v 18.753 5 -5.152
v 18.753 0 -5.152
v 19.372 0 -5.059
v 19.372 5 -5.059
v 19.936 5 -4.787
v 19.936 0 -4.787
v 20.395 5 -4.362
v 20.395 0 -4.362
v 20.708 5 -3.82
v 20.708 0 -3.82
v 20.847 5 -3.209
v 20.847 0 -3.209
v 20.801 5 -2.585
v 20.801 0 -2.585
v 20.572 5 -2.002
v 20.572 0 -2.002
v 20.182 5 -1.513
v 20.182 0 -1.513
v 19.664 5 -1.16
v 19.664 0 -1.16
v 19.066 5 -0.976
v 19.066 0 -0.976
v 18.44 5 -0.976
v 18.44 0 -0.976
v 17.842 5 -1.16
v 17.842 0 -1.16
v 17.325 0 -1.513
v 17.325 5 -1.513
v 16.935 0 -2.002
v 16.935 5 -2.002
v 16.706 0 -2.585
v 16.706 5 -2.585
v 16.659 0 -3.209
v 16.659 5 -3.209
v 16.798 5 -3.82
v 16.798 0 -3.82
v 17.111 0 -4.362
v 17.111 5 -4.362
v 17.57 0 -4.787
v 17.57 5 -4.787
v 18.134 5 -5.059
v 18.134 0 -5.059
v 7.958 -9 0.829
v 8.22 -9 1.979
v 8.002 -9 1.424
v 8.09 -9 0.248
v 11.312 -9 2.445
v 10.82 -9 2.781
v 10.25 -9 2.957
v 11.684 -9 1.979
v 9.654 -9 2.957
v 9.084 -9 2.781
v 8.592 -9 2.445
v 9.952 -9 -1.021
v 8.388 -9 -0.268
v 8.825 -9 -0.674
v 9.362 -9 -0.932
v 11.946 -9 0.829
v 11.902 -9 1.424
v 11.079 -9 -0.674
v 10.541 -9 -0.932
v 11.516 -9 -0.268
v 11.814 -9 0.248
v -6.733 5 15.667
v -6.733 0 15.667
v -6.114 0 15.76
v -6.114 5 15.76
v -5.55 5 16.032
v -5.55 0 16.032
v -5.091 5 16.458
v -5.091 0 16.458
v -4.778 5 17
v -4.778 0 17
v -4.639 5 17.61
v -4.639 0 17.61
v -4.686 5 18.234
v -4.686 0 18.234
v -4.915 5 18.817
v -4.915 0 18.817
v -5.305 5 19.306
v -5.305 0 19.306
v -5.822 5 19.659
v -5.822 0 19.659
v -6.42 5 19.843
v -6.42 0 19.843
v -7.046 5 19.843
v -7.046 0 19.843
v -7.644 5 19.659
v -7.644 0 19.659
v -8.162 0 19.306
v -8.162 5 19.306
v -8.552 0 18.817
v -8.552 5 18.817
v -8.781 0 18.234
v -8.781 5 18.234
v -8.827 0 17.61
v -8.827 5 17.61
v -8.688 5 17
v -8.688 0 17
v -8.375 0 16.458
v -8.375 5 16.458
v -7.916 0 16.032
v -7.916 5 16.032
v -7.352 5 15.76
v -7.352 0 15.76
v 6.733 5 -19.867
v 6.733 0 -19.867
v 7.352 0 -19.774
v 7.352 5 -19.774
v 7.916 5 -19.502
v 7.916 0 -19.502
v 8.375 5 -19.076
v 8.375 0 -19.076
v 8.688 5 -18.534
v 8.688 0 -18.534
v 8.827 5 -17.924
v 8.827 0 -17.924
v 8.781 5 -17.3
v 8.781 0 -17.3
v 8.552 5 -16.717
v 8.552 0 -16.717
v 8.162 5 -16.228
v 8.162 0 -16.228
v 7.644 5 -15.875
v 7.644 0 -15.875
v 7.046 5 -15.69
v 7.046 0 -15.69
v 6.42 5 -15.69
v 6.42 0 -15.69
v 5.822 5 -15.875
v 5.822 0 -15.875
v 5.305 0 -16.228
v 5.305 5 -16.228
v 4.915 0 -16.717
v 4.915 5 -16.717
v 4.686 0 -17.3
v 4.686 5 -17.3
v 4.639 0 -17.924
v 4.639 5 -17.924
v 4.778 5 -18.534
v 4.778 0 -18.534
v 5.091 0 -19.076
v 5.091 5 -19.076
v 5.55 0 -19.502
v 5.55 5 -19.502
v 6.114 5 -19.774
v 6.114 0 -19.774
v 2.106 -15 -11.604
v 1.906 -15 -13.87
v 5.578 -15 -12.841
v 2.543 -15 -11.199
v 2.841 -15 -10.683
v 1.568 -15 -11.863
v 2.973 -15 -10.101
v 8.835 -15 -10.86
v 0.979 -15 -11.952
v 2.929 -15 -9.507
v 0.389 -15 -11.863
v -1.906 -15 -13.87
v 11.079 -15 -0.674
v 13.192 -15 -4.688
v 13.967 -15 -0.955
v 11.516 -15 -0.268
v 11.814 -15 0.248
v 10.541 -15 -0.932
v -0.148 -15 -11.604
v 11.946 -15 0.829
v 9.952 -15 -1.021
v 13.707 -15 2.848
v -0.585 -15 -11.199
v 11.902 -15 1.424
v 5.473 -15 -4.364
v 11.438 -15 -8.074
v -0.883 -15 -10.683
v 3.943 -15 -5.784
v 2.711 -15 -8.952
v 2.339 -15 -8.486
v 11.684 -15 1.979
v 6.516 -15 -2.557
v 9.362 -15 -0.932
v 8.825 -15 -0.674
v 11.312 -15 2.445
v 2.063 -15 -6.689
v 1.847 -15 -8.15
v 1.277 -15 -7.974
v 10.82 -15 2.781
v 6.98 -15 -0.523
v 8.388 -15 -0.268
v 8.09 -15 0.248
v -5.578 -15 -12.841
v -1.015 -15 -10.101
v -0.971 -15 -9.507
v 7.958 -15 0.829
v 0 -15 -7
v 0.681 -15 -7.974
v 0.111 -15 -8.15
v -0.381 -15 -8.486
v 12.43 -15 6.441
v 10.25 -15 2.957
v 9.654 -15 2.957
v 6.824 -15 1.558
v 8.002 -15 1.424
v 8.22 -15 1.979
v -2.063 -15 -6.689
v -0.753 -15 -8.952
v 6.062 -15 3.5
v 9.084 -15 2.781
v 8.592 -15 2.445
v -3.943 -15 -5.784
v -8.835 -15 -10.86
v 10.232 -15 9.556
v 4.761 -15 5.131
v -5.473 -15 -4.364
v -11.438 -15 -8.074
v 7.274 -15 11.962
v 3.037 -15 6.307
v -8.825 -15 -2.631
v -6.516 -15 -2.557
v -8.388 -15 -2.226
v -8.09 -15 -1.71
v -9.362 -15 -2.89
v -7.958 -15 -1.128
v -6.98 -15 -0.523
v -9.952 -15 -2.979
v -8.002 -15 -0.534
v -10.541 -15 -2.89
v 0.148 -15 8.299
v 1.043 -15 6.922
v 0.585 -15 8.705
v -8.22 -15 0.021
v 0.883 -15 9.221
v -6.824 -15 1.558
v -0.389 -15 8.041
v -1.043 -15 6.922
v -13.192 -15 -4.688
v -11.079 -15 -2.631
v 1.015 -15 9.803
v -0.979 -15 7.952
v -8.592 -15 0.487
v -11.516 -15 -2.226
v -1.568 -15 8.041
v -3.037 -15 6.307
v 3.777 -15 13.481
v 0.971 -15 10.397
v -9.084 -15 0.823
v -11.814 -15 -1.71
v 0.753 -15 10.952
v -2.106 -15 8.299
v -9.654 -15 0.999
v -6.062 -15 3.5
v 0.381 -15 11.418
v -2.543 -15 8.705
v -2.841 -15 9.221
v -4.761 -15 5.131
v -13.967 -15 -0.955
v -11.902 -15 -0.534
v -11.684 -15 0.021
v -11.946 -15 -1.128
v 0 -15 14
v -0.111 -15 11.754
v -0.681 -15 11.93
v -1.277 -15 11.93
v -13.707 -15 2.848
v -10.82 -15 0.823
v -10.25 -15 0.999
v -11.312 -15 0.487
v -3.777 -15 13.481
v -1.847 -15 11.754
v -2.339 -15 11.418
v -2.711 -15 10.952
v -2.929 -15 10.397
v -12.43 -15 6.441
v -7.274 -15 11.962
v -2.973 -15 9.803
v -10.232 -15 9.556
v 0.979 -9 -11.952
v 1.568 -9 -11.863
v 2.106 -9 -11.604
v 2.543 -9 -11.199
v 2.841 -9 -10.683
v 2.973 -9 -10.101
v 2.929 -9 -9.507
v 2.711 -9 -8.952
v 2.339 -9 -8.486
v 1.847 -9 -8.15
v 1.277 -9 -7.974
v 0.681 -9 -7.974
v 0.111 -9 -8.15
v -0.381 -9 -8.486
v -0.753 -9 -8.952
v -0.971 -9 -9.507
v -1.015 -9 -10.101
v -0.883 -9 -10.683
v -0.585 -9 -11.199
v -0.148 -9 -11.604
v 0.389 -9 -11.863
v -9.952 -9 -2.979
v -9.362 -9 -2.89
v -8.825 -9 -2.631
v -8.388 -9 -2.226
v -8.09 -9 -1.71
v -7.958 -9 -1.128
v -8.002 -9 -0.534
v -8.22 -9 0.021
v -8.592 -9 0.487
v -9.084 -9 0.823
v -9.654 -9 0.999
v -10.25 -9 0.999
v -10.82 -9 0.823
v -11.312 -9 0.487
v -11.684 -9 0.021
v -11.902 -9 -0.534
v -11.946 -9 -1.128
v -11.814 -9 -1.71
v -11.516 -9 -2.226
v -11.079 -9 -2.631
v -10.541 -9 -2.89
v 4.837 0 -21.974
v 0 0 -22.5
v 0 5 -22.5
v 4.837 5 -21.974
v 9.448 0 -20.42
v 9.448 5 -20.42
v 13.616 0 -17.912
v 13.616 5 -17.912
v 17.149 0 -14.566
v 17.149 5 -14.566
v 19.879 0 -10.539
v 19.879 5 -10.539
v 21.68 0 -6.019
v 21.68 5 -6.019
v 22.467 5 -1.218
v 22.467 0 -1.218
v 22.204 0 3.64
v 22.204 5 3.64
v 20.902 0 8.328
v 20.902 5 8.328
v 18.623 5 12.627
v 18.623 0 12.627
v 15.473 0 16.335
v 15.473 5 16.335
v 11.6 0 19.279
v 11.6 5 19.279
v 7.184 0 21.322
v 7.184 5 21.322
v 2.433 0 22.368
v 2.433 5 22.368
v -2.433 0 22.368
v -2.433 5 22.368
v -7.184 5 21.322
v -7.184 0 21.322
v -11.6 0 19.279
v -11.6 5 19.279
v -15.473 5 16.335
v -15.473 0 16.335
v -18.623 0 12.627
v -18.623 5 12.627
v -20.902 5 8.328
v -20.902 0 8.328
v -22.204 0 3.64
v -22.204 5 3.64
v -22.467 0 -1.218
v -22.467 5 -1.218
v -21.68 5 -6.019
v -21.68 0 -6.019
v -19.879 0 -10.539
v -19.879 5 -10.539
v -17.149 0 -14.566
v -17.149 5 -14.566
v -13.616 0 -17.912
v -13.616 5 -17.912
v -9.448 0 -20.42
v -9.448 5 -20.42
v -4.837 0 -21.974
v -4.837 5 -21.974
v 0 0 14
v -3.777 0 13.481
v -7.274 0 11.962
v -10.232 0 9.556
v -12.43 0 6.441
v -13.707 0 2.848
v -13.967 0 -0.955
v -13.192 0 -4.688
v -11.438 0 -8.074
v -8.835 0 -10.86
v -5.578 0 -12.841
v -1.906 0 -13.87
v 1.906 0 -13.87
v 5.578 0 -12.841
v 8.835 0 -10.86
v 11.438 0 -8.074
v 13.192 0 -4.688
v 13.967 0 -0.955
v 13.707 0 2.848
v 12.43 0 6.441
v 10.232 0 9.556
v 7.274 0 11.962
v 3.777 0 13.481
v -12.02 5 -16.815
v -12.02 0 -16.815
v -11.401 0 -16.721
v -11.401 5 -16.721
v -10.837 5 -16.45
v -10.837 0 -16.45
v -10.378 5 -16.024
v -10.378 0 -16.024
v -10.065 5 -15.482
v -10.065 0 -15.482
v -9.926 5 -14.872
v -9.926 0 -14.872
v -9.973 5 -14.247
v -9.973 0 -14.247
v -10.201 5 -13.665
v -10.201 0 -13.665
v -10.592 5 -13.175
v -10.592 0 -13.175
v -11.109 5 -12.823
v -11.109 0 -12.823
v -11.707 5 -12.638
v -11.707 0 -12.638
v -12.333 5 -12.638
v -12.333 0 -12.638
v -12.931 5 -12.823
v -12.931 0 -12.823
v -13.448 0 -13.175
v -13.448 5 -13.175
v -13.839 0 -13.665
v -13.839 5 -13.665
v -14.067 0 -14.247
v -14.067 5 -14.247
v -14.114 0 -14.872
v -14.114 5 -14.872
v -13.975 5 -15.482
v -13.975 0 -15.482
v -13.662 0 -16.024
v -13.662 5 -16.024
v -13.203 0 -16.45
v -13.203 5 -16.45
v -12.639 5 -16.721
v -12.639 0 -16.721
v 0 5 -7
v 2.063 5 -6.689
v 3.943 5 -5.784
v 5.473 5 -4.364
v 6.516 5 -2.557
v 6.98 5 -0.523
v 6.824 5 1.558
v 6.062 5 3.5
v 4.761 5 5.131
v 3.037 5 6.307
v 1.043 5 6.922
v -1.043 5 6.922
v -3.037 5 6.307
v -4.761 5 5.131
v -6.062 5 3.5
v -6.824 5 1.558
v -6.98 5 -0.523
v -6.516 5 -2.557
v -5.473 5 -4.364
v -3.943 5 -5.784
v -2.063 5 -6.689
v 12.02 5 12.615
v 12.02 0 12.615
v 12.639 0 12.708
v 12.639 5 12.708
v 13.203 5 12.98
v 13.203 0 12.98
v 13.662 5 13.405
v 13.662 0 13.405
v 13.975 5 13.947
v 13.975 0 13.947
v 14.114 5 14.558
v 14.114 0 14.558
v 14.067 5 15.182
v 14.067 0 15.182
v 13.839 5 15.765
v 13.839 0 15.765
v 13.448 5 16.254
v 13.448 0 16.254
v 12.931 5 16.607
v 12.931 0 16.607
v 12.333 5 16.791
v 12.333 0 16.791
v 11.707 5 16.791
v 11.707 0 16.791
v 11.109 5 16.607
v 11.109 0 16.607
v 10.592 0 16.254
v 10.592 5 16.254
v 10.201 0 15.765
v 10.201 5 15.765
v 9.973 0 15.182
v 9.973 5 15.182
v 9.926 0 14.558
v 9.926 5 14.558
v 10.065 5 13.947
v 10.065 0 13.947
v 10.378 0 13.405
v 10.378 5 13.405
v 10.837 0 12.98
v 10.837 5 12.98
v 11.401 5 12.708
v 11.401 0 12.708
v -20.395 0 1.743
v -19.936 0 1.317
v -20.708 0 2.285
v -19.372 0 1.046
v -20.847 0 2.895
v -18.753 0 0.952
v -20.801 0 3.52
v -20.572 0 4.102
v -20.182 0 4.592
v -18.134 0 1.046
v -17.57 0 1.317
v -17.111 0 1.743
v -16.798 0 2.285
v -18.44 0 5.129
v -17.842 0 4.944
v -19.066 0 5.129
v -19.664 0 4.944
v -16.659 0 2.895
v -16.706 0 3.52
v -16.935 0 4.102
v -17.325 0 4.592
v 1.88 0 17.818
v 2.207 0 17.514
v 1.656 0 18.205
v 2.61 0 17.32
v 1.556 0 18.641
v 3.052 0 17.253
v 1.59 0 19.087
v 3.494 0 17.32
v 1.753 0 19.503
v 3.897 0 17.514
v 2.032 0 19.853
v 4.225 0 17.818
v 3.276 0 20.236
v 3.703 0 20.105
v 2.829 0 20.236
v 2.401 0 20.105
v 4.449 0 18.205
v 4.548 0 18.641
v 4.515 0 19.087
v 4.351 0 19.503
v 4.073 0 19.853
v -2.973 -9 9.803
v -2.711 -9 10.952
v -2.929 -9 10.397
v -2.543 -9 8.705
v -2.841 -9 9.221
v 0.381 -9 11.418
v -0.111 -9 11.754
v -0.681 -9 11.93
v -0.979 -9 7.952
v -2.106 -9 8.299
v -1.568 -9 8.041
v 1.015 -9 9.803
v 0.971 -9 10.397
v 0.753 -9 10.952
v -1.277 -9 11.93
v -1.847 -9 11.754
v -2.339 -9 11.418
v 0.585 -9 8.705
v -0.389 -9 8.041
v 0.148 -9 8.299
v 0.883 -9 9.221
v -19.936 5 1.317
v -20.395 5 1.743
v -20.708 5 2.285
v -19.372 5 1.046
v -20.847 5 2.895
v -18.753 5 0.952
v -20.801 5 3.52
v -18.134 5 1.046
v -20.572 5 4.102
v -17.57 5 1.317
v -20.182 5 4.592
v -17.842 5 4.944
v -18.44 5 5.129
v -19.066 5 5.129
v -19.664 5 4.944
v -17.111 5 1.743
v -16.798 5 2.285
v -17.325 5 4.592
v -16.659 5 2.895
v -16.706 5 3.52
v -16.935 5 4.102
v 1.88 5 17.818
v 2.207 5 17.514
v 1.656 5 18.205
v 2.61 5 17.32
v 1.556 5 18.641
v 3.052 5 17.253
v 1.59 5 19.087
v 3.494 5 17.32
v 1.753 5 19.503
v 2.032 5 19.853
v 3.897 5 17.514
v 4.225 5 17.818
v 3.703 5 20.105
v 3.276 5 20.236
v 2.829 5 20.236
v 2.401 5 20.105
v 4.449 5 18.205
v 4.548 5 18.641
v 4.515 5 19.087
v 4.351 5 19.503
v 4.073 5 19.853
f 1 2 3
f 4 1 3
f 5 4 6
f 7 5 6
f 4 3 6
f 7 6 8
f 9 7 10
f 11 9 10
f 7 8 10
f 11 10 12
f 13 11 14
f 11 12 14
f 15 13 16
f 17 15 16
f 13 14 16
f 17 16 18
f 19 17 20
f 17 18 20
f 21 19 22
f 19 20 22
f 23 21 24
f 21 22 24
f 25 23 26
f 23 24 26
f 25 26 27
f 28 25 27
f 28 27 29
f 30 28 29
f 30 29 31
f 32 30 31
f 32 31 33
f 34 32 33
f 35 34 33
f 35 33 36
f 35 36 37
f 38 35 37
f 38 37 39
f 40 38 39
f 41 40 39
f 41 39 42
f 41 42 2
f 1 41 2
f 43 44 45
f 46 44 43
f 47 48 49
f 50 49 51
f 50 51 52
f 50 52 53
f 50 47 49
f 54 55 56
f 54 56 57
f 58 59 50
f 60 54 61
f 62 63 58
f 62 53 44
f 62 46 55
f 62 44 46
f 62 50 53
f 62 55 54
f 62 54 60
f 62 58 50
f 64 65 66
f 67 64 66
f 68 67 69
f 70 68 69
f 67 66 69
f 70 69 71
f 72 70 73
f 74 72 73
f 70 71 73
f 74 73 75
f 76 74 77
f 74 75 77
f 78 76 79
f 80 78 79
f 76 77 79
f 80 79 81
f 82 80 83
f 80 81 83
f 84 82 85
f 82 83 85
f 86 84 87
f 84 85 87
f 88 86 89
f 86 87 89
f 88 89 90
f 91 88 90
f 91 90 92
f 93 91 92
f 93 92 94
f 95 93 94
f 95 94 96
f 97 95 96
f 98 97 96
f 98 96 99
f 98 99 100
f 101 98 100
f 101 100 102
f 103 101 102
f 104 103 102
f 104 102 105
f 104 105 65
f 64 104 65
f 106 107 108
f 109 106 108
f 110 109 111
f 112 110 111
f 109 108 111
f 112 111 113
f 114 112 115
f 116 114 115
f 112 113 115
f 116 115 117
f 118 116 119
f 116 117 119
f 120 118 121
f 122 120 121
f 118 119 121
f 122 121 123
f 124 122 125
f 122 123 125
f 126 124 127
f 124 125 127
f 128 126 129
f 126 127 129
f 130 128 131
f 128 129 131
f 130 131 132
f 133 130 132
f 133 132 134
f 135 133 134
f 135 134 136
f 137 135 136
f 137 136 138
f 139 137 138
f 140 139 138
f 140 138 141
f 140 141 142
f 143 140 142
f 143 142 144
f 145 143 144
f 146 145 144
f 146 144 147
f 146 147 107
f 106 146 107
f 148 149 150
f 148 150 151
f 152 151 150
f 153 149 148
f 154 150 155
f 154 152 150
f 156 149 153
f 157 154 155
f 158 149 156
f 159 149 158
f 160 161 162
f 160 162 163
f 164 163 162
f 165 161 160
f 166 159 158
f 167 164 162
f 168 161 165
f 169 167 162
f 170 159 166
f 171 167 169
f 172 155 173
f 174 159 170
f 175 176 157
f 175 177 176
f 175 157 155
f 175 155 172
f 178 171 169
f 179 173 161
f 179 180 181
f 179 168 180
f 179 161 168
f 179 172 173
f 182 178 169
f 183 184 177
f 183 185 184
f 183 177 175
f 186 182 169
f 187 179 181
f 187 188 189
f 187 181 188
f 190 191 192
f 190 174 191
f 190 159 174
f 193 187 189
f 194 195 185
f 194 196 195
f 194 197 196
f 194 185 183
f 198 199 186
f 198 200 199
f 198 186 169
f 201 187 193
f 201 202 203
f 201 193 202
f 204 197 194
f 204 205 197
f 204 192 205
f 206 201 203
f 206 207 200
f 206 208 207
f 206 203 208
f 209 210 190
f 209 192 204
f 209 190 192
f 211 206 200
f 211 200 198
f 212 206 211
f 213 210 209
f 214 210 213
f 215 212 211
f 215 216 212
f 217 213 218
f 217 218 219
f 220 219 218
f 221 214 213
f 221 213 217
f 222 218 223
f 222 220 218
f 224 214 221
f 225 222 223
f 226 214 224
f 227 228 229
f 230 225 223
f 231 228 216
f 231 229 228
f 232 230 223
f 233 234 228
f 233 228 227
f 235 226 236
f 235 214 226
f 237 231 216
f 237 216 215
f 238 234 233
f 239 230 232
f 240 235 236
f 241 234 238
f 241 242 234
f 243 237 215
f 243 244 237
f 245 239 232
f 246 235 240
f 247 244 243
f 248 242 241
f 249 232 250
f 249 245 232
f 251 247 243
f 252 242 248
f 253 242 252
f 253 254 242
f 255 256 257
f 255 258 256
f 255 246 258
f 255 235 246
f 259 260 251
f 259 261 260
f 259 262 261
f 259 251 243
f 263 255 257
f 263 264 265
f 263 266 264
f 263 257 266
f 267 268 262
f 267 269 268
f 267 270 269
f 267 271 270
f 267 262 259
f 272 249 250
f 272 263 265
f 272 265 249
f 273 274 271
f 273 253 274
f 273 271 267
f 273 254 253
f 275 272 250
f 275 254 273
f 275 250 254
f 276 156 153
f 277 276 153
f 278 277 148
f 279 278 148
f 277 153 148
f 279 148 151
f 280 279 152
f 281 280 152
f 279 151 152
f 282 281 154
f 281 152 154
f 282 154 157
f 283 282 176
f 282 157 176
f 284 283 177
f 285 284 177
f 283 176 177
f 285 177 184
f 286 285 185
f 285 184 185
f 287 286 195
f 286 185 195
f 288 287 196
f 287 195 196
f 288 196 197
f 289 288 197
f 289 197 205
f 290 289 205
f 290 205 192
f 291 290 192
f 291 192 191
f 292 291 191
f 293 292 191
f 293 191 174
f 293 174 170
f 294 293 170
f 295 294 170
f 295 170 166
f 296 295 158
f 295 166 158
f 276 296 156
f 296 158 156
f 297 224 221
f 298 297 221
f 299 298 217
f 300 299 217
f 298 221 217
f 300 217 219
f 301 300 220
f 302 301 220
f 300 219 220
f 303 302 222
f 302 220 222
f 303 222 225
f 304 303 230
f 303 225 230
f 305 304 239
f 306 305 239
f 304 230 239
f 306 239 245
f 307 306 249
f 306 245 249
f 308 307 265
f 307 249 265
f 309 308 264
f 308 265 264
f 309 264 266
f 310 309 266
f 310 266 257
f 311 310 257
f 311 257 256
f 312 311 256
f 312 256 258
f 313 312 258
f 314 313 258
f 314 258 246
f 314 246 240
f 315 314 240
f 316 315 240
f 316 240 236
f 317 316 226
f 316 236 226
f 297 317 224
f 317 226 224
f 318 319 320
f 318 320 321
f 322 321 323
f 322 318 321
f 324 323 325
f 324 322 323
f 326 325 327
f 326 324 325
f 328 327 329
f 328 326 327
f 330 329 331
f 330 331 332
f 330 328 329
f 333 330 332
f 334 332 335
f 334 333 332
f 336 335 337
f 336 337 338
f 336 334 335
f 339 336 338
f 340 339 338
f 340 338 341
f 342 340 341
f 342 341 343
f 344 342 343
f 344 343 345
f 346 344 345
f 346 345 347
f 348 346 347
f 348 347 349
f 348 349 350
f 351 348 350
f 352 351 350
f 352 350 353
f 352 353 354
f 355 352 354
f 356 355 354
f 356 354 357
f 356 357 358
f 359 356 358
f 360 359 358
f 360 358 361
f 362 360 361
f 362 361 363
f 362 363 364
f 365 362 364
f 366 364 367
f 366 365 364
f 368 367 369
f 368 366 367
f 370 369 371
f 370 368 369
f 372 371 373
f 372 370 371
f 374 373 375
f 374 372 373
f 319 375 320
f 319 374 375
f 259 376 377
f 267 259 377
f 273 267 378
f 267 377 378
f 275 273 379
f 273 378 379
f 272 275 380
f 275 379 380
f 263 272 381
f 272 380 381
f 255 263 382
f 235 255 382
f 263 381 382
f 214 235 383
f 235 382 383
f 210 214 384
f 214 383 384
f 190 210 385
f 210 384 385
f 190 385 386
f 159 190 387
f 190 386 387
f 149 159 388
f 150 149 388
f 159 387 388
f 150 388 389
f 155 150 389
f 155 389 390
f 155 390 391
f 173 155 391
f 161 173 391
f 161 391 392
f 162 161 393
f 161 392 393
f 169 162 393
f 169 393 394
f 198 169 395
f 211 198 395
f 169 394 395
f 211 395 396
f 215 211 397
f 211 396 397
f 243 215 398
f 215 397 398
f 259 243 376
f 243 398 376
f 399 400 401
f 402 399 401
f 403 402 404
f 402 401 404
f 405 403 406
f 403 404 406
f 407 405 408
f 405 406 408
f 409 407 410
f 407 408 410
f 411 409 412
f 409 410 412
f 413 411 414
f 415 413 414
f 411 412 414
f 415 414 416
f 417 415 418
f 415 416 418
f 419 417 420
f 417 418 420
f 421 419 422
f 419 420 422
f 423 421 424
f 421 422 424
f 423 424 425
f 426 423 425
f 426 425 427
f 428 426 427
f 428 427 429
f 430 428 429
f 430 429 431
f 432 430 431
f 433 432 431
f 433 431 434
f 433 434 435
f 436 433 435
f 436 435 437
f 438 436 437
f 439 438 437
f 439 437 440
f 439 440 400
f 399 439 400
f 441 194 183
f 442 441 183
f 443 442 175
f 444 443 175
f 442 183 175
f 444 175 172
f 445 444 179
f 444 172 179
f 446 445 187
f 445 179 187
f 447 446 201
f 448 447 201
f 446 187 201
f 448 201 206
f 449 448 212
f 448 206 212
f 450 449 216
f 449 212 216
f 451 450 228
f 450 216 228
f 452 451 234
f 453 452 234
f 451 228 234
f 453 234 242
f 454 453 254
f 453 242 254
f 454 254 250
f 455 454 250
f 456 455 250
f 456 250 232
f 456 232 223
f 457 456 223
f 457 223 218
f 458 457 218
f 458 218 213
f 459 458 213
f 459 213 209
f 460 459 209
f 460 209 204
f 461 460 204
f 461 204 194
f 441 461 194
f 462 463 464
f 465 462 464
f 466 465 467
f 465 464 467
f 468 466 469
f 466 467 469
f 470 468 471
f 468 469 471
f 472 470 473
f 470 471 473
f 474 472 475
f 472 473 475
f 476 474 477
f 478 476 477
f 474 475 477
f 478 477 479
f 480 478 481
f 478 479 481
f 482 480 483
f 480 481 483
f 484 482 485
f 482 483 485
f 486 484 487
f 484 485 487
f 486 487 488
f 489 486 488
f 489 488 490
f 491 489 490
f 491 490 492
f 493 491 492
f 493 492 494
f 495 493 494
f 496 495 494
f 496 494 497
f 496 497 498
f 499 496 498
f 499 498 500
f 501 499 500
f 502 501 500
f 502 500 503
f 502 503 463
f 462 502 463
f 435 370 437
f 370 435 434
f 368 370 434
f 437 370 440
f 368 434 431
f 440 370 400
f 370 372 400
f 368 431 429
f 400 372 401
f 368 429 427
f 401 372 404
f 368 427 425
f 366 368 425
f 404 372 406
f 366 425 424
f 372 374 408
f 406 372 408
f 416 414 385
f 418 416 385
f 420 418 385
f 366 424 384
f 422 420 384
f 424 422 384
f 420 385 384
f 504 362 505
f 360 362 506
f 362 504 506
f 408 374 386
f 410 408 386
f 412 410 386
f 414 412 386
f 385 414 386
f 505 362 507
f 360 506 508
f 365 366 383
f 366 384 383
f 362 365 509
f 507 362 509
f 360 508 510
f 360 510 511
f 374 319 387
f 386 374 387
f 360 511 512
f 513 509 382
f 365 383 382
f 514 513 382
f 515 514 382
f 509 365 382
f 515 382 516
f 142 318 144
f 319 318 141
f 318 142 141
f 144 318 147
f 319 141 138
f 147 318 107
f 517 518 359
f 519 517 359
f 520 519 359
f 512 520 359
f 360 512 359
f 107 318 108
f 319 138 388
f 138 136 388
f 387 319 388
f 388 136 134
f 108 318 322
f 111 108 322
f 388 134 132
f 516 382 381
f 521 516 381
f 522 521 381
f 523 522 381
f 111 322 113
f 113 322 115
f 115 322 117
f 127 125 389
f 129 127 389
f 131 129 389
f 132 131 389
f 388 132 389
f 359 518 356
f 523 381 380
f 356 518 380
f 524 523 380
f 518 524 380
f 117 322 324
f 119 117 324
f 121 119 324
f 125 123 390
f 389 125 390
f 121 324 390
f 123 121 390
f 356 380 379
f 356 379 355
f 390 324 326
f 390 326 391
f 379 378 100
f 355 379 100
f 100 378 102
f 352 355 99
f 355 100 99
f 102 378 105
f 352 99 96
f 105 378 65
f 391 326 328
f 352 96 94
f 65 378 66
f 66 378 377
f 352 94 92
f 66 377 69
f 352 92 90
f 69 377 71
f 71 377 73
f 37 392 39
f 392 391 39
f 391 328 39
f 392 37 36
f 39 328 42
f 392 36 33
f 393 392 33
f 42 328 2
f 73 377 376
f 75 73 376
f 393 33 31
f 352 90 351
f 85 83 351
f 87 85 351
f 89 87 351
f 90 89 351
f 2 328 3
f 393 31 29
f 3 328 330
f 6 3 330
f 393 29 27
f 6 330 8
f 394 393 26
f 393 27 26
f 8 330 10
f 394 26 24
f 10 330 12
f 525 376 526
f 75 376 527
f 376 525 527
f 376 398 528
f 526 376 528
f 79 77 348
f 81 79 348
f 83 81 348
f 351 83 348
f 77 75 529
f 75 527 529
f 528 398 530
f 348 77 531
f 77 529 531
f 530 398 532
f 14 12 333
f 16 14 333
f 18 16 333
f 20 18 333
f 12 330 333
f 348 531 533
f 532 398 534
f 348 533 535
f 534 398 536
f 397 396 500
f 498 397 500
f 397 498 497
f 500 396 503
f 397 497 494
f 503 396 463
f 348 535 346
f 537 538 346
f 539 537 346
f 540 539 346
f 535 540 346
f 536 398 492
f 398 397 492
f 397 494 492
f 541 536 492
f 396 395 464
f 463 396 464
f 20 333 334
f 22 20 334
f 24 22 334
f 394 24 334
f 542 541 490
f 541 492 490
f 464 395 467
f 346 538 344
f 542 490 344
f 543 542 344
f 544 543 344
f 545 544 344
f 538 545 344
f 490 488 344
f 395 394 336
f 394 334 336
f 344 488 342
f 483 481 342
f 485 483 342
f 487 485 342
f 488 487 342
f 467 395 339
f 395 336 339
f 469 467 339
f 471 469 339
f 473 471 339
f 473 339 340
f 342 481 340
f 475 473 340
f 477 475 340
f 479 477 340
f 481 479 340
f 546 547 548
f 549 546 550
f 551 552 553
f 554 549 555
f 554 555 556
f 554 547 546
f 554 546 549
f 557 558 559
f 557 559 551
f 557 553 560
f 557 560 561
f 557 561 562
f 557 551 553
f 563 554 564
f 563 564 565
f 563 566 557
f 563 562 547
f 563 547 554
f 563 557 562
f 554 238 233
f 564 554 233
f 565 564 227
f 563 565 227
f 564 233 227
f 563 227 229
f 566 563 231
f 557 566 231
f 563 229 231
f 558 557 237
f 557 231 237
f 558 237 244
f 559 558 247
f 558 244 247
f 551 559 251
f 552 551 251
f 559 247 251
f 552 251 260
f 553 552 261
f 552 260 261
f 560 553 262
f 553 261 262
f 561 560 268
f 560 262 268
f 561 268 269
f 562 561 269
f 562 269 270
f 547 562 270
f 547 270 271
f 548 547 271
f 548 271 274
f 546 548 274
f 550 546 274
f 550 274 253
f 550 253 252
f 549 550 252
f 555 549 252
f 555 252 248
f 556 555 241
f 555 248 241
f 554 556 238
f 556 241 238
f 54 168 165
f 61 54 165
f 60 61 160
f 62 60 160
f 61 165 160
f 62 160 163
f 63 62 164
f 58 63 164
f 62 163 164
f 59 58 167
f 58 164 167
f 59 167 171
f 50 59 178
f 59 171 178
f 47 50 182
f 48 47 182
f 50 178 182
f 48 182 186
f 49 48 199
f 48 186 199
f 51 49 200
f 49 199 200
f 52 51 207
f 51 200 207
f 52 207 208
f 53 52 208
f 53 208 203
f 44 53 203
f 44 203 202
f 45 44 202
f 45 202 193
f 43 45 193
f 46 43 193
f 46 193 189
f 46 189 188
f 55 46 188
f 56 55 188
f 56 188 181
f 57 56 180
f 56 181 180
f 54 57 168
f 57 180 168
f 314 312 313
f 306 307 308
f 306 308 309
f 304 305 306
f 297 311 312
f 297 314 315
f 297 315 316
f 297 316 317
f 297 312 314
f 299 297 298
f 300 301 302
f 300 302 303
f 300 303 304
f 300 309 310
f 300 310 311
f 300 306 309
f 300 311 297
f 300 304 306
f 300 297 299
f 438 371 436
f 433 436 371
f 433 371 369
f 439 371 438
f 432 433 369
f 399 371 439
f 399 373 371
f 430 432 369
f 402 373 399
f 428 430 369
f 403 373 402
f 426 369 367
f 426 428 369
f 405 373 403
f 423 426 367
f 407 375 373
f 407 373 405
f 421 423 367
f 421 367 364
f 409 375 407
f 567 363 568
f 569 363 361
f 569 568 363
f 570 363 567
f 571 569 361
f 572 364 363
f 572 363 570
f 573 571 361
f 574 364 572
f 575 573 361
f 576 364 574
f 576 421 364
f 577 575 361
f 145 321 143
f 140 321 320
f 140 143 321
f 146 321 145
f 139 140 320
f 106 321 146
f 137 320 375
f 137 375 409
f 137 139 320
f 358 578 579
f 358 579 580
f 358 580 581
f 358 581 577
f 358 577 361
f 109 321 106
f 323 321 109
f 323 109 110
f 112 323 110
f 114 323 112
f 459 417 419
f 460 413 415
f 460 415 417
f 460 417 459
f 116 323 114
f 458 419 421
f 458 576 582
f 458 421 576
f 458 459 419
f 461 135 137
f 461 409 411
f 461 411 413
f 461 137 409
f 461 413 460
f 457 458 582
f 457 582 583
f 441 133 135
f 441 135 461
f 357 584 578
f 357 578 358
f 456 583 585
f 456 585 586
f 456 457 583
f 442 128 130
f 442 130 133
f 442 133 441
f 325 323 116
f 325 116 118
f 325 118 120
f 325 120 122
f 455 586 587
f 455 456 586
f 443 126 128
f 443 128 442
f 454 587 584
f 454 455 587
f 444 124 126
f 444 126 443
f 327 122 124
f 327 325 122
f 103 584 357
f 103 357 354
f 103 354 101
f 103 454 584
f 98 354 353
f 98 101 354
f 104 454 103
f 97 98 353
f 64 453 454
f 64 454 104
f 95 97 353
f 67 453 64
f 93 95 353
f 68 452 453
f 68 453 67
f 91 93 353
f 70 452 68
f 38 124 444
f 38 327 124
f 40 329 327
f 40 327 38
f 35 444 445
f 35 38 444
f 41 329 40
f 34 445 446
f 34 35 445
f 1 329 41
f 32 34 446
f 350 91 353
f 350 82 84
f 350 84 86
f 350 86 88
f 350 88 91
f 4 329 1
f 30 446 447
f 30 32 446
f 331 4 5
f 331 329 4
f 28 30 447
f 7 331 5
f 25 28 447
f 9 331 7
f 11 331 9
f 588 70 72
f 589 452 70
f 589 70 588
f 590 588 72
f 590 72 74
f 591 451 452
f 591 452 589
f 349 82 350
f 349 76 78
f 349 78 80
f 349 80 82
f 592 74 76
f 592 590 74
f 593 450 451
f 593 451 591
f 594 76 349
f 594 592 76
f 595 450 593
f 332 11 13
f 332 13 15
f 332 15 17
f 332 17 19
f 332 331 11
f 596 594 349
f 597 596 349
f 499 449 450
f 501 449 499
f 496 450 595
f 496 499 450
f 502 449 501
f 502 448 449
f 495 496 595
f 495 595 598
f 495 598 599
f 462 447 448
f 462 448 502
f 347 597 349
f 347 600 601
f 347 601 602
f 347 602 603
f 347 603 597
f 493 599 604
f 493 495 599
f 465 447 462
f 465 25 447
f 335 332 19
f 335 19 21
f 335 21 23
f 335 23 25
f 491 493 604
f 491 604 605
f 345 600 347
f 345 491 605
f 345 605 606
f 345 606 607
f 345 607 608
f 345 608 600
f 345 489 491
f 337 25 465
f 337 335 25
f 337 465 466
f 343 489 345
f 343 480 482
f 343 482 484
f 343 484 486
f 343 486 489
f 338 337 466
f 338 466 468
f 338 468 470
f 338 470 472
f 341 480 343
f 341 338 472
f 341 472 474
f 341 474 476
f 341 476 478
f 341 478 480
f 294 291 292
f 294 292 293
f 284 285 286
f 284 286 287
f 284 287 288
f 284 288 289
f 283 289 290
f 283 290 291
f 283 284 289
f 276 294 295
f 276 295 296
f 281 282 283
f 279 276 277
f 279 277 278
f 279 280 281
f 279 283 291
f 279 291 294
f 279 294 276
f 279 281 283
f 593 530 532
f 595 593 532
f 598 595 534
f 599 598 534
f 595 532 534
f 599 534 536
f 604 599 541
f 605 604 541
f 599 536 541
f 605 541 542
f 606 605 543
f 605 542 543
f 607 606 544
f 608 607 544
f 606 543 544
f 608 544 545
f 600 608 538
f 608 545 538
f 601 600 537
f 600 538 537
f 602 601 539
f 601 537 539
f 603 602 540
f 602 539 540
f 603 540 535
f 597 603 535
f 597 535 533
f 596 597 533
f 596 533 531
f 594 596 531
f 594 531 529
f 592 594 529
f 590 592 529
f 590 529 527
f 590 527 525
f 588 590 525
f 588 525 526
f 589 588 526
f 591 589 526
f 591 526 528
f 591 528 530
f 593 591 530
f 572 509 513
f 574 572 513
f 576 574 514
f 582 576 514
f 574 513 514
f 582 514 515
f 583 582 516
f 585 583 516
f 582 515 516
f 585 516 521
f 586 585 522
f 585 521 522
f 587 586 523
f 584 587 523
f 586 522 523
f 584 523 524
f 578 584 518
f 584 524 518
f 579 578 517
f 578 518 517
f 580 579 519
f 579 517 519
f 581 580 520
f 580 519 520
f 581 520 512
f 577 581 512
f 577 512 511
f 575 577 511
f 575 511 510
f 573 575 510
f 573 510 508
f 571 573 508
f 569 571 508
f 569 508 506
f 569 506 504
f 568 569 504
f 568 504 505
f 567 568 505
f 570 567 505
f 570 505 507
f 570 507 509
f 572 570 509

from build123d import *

# Parameters (mm, degrees)
SKETCH1_R           = 30
BOSS_EXTRUDE1_DEPTH = 5
SKETCH2_R           = 30
SKETCH2_R_2         = 22.5
SKETCH2_R_3         = 2.1
SKETCH2_R_4         = 1.5
CUT_EXTRUDE1_DEPTH  = 10
SKETCH3_R           = 14
BOSS_EXTRUDE2_DEPTH = 15
SKETCH4_R           = 2
CUT_EXTRUDE2_DEPTH  = 6
SKETCH5_R           = 7
CUT_EXTRUDE3_DEPTH  = 38.583240946


with BuildPart() as part:
    # Sketch1 → Boss-Extrude1 (new body)
    with BuildSketch(Plane(origin=(0, 0, 0), x_dir=(1, 0, 0), z_dir=(0, 1, 0))):
        with Locations(Location((0, 0, 0), (0, 0, 270))):
            Circle(SKETCH1_R)
    extrude(amount=BOSS_EXTRUDE1_DEPTH)

    # Sketch2 → Cut-Extrude1 (cut)
    # profile 1 of 8: a face of its own
    with BuildSketch(Plane(origin=(0, 0, 0), x_dir=(-1, 0, 0), z_dir=(0, -1, 0))):
        Circle(SKETCH2_R)
        with Locations(Location((0, 0, 0), (0, 0, 90))):
            Circle(SKETCH2_R_2, mode=Mode.SUBTRACT)
    # profile 2 of 8: a face of its own
    with BuildSketch(Plane(origin=(0, 0, 0), x_dir=(-1, 0, 0), z_dir=(0, -1, 0))):
        with Locations(Location((12.019973653, 14.714626511, 0), (0, 0, 90))):
            Circle(SKETCH2_R_3)
    # profile 3 of 8: a face of its own
    with BuildSketch(Plane(origin=(0, 0, 0), x_dir=(-1, 0, 0), z_dir=(0, -1, 0))):
        with Locations(Location((-6.733253539, 17.766915792, 0), (0, 0, 90))):
            Circle(SKETCH2_R_3)
    # profile 4 of 8: a face of its own
    with BuildSketch(Plane(origin=(0, 0, 0), x_dir=(-1, 0, 0), z_dir=(0, -1, 0))):
        with Locations(Location((-18.753227193, 3.052289281, 0), (0, 0, 90))):
            Circle(SKETCH2_R_3)
    # profile 5 of 8: a face of its own
    with BuildSketch(Plane(origin=(0, 0, 0), x_dir=(-1, 0, 0), z_dir=(0, -1, 0))):
        with Locations(Location((-12.019973653, -14.714626511, 0), (0, 0, 90))):
            Circle(SKETCH2_R_3)
    # profile 6 of 8: a face of its own
    with BuildSketch(Plane(origin=(0, 0, 0), x_dir=(-1, 0, 0), z_dir=(0, -1, 0))):
        with Locations(Location((-3.052289281, -18.753227193, 0), (0, 0, 90))):
            Circle(SKETCH2_R_4)
    # profile 7 of 8: a face of its own
    with BuildSketch(Plane(origin=(0, 0, 0), x_dir=(-1, 0, 0), z_dir=(0, -1, 0))):
        with Locations(Location((6.733253539, -17.766915792, 0), (0, 0, 90))):
            Circle(SKETCH2_R_3)
    # profile 8 of 8: a face of its own
    with BuildSketch(Plane(origin=(0, 0, 0), x_dir=(-1, 0, 0), z_dir=(0, -1, 0))):
        with Locations(Location((18.753227193, -3.052289281, 0), (0, 0, 90))):
            Circle(SKETCH2_R_3)
    extrude(amount=-CUT_EXTRUDE1_DEPTH, mode=Mode.SUBTRACT)

    # Sketch3 → Boss-Extrude2 (add)
    with BuildSketch(Plane.XZ):
        with Locations(Location((0, 0, 0), (0, 0, 90))):
            Circle(SKETCH3_R)
    extrude(amount=BOSS_EXTRUDE2_DEPTH)

    # Sketch4 → Cut-Extrude2 (cut)
    with BuildSketch(Plane.XZ.offset(15)):
        with Locations(Location((-0.978927697, 9.951969683, 0), (0, 0, 270))):
            Circle(SKETCH4_R)
        with Locations(Location((-9.951969683, -0.978927697, 0), (0, 0, 270))):
            Circle(SKETCH4_R)
        with Locations(Location((0.978927697, -9.951969683, 0), (0, 0, 270))):
            Circle(SKETCH4_R)
        with Locations(Location((9.951969683, 0.978927697, 0), (0, 0, 270))):
            Circle(SKETCH4_R)
    extrude(amount=-CUT_EXTRUDE2_DEPTH, mode=Mode.SUBTRACT)

    # Sketch5 → Cut-Extrude3 (cut, through all)
    with BuildSketch(Plane.XZ.offset(15)):
        with Locations(Location((0, 0, 0), (0, 0, 270))):
            Circle(SKETCH5_R)
    extrude(amount=-CUT_EXTRUDE3_DEPTH, mode=Mode.SUBTRACT)


solid = part.part
